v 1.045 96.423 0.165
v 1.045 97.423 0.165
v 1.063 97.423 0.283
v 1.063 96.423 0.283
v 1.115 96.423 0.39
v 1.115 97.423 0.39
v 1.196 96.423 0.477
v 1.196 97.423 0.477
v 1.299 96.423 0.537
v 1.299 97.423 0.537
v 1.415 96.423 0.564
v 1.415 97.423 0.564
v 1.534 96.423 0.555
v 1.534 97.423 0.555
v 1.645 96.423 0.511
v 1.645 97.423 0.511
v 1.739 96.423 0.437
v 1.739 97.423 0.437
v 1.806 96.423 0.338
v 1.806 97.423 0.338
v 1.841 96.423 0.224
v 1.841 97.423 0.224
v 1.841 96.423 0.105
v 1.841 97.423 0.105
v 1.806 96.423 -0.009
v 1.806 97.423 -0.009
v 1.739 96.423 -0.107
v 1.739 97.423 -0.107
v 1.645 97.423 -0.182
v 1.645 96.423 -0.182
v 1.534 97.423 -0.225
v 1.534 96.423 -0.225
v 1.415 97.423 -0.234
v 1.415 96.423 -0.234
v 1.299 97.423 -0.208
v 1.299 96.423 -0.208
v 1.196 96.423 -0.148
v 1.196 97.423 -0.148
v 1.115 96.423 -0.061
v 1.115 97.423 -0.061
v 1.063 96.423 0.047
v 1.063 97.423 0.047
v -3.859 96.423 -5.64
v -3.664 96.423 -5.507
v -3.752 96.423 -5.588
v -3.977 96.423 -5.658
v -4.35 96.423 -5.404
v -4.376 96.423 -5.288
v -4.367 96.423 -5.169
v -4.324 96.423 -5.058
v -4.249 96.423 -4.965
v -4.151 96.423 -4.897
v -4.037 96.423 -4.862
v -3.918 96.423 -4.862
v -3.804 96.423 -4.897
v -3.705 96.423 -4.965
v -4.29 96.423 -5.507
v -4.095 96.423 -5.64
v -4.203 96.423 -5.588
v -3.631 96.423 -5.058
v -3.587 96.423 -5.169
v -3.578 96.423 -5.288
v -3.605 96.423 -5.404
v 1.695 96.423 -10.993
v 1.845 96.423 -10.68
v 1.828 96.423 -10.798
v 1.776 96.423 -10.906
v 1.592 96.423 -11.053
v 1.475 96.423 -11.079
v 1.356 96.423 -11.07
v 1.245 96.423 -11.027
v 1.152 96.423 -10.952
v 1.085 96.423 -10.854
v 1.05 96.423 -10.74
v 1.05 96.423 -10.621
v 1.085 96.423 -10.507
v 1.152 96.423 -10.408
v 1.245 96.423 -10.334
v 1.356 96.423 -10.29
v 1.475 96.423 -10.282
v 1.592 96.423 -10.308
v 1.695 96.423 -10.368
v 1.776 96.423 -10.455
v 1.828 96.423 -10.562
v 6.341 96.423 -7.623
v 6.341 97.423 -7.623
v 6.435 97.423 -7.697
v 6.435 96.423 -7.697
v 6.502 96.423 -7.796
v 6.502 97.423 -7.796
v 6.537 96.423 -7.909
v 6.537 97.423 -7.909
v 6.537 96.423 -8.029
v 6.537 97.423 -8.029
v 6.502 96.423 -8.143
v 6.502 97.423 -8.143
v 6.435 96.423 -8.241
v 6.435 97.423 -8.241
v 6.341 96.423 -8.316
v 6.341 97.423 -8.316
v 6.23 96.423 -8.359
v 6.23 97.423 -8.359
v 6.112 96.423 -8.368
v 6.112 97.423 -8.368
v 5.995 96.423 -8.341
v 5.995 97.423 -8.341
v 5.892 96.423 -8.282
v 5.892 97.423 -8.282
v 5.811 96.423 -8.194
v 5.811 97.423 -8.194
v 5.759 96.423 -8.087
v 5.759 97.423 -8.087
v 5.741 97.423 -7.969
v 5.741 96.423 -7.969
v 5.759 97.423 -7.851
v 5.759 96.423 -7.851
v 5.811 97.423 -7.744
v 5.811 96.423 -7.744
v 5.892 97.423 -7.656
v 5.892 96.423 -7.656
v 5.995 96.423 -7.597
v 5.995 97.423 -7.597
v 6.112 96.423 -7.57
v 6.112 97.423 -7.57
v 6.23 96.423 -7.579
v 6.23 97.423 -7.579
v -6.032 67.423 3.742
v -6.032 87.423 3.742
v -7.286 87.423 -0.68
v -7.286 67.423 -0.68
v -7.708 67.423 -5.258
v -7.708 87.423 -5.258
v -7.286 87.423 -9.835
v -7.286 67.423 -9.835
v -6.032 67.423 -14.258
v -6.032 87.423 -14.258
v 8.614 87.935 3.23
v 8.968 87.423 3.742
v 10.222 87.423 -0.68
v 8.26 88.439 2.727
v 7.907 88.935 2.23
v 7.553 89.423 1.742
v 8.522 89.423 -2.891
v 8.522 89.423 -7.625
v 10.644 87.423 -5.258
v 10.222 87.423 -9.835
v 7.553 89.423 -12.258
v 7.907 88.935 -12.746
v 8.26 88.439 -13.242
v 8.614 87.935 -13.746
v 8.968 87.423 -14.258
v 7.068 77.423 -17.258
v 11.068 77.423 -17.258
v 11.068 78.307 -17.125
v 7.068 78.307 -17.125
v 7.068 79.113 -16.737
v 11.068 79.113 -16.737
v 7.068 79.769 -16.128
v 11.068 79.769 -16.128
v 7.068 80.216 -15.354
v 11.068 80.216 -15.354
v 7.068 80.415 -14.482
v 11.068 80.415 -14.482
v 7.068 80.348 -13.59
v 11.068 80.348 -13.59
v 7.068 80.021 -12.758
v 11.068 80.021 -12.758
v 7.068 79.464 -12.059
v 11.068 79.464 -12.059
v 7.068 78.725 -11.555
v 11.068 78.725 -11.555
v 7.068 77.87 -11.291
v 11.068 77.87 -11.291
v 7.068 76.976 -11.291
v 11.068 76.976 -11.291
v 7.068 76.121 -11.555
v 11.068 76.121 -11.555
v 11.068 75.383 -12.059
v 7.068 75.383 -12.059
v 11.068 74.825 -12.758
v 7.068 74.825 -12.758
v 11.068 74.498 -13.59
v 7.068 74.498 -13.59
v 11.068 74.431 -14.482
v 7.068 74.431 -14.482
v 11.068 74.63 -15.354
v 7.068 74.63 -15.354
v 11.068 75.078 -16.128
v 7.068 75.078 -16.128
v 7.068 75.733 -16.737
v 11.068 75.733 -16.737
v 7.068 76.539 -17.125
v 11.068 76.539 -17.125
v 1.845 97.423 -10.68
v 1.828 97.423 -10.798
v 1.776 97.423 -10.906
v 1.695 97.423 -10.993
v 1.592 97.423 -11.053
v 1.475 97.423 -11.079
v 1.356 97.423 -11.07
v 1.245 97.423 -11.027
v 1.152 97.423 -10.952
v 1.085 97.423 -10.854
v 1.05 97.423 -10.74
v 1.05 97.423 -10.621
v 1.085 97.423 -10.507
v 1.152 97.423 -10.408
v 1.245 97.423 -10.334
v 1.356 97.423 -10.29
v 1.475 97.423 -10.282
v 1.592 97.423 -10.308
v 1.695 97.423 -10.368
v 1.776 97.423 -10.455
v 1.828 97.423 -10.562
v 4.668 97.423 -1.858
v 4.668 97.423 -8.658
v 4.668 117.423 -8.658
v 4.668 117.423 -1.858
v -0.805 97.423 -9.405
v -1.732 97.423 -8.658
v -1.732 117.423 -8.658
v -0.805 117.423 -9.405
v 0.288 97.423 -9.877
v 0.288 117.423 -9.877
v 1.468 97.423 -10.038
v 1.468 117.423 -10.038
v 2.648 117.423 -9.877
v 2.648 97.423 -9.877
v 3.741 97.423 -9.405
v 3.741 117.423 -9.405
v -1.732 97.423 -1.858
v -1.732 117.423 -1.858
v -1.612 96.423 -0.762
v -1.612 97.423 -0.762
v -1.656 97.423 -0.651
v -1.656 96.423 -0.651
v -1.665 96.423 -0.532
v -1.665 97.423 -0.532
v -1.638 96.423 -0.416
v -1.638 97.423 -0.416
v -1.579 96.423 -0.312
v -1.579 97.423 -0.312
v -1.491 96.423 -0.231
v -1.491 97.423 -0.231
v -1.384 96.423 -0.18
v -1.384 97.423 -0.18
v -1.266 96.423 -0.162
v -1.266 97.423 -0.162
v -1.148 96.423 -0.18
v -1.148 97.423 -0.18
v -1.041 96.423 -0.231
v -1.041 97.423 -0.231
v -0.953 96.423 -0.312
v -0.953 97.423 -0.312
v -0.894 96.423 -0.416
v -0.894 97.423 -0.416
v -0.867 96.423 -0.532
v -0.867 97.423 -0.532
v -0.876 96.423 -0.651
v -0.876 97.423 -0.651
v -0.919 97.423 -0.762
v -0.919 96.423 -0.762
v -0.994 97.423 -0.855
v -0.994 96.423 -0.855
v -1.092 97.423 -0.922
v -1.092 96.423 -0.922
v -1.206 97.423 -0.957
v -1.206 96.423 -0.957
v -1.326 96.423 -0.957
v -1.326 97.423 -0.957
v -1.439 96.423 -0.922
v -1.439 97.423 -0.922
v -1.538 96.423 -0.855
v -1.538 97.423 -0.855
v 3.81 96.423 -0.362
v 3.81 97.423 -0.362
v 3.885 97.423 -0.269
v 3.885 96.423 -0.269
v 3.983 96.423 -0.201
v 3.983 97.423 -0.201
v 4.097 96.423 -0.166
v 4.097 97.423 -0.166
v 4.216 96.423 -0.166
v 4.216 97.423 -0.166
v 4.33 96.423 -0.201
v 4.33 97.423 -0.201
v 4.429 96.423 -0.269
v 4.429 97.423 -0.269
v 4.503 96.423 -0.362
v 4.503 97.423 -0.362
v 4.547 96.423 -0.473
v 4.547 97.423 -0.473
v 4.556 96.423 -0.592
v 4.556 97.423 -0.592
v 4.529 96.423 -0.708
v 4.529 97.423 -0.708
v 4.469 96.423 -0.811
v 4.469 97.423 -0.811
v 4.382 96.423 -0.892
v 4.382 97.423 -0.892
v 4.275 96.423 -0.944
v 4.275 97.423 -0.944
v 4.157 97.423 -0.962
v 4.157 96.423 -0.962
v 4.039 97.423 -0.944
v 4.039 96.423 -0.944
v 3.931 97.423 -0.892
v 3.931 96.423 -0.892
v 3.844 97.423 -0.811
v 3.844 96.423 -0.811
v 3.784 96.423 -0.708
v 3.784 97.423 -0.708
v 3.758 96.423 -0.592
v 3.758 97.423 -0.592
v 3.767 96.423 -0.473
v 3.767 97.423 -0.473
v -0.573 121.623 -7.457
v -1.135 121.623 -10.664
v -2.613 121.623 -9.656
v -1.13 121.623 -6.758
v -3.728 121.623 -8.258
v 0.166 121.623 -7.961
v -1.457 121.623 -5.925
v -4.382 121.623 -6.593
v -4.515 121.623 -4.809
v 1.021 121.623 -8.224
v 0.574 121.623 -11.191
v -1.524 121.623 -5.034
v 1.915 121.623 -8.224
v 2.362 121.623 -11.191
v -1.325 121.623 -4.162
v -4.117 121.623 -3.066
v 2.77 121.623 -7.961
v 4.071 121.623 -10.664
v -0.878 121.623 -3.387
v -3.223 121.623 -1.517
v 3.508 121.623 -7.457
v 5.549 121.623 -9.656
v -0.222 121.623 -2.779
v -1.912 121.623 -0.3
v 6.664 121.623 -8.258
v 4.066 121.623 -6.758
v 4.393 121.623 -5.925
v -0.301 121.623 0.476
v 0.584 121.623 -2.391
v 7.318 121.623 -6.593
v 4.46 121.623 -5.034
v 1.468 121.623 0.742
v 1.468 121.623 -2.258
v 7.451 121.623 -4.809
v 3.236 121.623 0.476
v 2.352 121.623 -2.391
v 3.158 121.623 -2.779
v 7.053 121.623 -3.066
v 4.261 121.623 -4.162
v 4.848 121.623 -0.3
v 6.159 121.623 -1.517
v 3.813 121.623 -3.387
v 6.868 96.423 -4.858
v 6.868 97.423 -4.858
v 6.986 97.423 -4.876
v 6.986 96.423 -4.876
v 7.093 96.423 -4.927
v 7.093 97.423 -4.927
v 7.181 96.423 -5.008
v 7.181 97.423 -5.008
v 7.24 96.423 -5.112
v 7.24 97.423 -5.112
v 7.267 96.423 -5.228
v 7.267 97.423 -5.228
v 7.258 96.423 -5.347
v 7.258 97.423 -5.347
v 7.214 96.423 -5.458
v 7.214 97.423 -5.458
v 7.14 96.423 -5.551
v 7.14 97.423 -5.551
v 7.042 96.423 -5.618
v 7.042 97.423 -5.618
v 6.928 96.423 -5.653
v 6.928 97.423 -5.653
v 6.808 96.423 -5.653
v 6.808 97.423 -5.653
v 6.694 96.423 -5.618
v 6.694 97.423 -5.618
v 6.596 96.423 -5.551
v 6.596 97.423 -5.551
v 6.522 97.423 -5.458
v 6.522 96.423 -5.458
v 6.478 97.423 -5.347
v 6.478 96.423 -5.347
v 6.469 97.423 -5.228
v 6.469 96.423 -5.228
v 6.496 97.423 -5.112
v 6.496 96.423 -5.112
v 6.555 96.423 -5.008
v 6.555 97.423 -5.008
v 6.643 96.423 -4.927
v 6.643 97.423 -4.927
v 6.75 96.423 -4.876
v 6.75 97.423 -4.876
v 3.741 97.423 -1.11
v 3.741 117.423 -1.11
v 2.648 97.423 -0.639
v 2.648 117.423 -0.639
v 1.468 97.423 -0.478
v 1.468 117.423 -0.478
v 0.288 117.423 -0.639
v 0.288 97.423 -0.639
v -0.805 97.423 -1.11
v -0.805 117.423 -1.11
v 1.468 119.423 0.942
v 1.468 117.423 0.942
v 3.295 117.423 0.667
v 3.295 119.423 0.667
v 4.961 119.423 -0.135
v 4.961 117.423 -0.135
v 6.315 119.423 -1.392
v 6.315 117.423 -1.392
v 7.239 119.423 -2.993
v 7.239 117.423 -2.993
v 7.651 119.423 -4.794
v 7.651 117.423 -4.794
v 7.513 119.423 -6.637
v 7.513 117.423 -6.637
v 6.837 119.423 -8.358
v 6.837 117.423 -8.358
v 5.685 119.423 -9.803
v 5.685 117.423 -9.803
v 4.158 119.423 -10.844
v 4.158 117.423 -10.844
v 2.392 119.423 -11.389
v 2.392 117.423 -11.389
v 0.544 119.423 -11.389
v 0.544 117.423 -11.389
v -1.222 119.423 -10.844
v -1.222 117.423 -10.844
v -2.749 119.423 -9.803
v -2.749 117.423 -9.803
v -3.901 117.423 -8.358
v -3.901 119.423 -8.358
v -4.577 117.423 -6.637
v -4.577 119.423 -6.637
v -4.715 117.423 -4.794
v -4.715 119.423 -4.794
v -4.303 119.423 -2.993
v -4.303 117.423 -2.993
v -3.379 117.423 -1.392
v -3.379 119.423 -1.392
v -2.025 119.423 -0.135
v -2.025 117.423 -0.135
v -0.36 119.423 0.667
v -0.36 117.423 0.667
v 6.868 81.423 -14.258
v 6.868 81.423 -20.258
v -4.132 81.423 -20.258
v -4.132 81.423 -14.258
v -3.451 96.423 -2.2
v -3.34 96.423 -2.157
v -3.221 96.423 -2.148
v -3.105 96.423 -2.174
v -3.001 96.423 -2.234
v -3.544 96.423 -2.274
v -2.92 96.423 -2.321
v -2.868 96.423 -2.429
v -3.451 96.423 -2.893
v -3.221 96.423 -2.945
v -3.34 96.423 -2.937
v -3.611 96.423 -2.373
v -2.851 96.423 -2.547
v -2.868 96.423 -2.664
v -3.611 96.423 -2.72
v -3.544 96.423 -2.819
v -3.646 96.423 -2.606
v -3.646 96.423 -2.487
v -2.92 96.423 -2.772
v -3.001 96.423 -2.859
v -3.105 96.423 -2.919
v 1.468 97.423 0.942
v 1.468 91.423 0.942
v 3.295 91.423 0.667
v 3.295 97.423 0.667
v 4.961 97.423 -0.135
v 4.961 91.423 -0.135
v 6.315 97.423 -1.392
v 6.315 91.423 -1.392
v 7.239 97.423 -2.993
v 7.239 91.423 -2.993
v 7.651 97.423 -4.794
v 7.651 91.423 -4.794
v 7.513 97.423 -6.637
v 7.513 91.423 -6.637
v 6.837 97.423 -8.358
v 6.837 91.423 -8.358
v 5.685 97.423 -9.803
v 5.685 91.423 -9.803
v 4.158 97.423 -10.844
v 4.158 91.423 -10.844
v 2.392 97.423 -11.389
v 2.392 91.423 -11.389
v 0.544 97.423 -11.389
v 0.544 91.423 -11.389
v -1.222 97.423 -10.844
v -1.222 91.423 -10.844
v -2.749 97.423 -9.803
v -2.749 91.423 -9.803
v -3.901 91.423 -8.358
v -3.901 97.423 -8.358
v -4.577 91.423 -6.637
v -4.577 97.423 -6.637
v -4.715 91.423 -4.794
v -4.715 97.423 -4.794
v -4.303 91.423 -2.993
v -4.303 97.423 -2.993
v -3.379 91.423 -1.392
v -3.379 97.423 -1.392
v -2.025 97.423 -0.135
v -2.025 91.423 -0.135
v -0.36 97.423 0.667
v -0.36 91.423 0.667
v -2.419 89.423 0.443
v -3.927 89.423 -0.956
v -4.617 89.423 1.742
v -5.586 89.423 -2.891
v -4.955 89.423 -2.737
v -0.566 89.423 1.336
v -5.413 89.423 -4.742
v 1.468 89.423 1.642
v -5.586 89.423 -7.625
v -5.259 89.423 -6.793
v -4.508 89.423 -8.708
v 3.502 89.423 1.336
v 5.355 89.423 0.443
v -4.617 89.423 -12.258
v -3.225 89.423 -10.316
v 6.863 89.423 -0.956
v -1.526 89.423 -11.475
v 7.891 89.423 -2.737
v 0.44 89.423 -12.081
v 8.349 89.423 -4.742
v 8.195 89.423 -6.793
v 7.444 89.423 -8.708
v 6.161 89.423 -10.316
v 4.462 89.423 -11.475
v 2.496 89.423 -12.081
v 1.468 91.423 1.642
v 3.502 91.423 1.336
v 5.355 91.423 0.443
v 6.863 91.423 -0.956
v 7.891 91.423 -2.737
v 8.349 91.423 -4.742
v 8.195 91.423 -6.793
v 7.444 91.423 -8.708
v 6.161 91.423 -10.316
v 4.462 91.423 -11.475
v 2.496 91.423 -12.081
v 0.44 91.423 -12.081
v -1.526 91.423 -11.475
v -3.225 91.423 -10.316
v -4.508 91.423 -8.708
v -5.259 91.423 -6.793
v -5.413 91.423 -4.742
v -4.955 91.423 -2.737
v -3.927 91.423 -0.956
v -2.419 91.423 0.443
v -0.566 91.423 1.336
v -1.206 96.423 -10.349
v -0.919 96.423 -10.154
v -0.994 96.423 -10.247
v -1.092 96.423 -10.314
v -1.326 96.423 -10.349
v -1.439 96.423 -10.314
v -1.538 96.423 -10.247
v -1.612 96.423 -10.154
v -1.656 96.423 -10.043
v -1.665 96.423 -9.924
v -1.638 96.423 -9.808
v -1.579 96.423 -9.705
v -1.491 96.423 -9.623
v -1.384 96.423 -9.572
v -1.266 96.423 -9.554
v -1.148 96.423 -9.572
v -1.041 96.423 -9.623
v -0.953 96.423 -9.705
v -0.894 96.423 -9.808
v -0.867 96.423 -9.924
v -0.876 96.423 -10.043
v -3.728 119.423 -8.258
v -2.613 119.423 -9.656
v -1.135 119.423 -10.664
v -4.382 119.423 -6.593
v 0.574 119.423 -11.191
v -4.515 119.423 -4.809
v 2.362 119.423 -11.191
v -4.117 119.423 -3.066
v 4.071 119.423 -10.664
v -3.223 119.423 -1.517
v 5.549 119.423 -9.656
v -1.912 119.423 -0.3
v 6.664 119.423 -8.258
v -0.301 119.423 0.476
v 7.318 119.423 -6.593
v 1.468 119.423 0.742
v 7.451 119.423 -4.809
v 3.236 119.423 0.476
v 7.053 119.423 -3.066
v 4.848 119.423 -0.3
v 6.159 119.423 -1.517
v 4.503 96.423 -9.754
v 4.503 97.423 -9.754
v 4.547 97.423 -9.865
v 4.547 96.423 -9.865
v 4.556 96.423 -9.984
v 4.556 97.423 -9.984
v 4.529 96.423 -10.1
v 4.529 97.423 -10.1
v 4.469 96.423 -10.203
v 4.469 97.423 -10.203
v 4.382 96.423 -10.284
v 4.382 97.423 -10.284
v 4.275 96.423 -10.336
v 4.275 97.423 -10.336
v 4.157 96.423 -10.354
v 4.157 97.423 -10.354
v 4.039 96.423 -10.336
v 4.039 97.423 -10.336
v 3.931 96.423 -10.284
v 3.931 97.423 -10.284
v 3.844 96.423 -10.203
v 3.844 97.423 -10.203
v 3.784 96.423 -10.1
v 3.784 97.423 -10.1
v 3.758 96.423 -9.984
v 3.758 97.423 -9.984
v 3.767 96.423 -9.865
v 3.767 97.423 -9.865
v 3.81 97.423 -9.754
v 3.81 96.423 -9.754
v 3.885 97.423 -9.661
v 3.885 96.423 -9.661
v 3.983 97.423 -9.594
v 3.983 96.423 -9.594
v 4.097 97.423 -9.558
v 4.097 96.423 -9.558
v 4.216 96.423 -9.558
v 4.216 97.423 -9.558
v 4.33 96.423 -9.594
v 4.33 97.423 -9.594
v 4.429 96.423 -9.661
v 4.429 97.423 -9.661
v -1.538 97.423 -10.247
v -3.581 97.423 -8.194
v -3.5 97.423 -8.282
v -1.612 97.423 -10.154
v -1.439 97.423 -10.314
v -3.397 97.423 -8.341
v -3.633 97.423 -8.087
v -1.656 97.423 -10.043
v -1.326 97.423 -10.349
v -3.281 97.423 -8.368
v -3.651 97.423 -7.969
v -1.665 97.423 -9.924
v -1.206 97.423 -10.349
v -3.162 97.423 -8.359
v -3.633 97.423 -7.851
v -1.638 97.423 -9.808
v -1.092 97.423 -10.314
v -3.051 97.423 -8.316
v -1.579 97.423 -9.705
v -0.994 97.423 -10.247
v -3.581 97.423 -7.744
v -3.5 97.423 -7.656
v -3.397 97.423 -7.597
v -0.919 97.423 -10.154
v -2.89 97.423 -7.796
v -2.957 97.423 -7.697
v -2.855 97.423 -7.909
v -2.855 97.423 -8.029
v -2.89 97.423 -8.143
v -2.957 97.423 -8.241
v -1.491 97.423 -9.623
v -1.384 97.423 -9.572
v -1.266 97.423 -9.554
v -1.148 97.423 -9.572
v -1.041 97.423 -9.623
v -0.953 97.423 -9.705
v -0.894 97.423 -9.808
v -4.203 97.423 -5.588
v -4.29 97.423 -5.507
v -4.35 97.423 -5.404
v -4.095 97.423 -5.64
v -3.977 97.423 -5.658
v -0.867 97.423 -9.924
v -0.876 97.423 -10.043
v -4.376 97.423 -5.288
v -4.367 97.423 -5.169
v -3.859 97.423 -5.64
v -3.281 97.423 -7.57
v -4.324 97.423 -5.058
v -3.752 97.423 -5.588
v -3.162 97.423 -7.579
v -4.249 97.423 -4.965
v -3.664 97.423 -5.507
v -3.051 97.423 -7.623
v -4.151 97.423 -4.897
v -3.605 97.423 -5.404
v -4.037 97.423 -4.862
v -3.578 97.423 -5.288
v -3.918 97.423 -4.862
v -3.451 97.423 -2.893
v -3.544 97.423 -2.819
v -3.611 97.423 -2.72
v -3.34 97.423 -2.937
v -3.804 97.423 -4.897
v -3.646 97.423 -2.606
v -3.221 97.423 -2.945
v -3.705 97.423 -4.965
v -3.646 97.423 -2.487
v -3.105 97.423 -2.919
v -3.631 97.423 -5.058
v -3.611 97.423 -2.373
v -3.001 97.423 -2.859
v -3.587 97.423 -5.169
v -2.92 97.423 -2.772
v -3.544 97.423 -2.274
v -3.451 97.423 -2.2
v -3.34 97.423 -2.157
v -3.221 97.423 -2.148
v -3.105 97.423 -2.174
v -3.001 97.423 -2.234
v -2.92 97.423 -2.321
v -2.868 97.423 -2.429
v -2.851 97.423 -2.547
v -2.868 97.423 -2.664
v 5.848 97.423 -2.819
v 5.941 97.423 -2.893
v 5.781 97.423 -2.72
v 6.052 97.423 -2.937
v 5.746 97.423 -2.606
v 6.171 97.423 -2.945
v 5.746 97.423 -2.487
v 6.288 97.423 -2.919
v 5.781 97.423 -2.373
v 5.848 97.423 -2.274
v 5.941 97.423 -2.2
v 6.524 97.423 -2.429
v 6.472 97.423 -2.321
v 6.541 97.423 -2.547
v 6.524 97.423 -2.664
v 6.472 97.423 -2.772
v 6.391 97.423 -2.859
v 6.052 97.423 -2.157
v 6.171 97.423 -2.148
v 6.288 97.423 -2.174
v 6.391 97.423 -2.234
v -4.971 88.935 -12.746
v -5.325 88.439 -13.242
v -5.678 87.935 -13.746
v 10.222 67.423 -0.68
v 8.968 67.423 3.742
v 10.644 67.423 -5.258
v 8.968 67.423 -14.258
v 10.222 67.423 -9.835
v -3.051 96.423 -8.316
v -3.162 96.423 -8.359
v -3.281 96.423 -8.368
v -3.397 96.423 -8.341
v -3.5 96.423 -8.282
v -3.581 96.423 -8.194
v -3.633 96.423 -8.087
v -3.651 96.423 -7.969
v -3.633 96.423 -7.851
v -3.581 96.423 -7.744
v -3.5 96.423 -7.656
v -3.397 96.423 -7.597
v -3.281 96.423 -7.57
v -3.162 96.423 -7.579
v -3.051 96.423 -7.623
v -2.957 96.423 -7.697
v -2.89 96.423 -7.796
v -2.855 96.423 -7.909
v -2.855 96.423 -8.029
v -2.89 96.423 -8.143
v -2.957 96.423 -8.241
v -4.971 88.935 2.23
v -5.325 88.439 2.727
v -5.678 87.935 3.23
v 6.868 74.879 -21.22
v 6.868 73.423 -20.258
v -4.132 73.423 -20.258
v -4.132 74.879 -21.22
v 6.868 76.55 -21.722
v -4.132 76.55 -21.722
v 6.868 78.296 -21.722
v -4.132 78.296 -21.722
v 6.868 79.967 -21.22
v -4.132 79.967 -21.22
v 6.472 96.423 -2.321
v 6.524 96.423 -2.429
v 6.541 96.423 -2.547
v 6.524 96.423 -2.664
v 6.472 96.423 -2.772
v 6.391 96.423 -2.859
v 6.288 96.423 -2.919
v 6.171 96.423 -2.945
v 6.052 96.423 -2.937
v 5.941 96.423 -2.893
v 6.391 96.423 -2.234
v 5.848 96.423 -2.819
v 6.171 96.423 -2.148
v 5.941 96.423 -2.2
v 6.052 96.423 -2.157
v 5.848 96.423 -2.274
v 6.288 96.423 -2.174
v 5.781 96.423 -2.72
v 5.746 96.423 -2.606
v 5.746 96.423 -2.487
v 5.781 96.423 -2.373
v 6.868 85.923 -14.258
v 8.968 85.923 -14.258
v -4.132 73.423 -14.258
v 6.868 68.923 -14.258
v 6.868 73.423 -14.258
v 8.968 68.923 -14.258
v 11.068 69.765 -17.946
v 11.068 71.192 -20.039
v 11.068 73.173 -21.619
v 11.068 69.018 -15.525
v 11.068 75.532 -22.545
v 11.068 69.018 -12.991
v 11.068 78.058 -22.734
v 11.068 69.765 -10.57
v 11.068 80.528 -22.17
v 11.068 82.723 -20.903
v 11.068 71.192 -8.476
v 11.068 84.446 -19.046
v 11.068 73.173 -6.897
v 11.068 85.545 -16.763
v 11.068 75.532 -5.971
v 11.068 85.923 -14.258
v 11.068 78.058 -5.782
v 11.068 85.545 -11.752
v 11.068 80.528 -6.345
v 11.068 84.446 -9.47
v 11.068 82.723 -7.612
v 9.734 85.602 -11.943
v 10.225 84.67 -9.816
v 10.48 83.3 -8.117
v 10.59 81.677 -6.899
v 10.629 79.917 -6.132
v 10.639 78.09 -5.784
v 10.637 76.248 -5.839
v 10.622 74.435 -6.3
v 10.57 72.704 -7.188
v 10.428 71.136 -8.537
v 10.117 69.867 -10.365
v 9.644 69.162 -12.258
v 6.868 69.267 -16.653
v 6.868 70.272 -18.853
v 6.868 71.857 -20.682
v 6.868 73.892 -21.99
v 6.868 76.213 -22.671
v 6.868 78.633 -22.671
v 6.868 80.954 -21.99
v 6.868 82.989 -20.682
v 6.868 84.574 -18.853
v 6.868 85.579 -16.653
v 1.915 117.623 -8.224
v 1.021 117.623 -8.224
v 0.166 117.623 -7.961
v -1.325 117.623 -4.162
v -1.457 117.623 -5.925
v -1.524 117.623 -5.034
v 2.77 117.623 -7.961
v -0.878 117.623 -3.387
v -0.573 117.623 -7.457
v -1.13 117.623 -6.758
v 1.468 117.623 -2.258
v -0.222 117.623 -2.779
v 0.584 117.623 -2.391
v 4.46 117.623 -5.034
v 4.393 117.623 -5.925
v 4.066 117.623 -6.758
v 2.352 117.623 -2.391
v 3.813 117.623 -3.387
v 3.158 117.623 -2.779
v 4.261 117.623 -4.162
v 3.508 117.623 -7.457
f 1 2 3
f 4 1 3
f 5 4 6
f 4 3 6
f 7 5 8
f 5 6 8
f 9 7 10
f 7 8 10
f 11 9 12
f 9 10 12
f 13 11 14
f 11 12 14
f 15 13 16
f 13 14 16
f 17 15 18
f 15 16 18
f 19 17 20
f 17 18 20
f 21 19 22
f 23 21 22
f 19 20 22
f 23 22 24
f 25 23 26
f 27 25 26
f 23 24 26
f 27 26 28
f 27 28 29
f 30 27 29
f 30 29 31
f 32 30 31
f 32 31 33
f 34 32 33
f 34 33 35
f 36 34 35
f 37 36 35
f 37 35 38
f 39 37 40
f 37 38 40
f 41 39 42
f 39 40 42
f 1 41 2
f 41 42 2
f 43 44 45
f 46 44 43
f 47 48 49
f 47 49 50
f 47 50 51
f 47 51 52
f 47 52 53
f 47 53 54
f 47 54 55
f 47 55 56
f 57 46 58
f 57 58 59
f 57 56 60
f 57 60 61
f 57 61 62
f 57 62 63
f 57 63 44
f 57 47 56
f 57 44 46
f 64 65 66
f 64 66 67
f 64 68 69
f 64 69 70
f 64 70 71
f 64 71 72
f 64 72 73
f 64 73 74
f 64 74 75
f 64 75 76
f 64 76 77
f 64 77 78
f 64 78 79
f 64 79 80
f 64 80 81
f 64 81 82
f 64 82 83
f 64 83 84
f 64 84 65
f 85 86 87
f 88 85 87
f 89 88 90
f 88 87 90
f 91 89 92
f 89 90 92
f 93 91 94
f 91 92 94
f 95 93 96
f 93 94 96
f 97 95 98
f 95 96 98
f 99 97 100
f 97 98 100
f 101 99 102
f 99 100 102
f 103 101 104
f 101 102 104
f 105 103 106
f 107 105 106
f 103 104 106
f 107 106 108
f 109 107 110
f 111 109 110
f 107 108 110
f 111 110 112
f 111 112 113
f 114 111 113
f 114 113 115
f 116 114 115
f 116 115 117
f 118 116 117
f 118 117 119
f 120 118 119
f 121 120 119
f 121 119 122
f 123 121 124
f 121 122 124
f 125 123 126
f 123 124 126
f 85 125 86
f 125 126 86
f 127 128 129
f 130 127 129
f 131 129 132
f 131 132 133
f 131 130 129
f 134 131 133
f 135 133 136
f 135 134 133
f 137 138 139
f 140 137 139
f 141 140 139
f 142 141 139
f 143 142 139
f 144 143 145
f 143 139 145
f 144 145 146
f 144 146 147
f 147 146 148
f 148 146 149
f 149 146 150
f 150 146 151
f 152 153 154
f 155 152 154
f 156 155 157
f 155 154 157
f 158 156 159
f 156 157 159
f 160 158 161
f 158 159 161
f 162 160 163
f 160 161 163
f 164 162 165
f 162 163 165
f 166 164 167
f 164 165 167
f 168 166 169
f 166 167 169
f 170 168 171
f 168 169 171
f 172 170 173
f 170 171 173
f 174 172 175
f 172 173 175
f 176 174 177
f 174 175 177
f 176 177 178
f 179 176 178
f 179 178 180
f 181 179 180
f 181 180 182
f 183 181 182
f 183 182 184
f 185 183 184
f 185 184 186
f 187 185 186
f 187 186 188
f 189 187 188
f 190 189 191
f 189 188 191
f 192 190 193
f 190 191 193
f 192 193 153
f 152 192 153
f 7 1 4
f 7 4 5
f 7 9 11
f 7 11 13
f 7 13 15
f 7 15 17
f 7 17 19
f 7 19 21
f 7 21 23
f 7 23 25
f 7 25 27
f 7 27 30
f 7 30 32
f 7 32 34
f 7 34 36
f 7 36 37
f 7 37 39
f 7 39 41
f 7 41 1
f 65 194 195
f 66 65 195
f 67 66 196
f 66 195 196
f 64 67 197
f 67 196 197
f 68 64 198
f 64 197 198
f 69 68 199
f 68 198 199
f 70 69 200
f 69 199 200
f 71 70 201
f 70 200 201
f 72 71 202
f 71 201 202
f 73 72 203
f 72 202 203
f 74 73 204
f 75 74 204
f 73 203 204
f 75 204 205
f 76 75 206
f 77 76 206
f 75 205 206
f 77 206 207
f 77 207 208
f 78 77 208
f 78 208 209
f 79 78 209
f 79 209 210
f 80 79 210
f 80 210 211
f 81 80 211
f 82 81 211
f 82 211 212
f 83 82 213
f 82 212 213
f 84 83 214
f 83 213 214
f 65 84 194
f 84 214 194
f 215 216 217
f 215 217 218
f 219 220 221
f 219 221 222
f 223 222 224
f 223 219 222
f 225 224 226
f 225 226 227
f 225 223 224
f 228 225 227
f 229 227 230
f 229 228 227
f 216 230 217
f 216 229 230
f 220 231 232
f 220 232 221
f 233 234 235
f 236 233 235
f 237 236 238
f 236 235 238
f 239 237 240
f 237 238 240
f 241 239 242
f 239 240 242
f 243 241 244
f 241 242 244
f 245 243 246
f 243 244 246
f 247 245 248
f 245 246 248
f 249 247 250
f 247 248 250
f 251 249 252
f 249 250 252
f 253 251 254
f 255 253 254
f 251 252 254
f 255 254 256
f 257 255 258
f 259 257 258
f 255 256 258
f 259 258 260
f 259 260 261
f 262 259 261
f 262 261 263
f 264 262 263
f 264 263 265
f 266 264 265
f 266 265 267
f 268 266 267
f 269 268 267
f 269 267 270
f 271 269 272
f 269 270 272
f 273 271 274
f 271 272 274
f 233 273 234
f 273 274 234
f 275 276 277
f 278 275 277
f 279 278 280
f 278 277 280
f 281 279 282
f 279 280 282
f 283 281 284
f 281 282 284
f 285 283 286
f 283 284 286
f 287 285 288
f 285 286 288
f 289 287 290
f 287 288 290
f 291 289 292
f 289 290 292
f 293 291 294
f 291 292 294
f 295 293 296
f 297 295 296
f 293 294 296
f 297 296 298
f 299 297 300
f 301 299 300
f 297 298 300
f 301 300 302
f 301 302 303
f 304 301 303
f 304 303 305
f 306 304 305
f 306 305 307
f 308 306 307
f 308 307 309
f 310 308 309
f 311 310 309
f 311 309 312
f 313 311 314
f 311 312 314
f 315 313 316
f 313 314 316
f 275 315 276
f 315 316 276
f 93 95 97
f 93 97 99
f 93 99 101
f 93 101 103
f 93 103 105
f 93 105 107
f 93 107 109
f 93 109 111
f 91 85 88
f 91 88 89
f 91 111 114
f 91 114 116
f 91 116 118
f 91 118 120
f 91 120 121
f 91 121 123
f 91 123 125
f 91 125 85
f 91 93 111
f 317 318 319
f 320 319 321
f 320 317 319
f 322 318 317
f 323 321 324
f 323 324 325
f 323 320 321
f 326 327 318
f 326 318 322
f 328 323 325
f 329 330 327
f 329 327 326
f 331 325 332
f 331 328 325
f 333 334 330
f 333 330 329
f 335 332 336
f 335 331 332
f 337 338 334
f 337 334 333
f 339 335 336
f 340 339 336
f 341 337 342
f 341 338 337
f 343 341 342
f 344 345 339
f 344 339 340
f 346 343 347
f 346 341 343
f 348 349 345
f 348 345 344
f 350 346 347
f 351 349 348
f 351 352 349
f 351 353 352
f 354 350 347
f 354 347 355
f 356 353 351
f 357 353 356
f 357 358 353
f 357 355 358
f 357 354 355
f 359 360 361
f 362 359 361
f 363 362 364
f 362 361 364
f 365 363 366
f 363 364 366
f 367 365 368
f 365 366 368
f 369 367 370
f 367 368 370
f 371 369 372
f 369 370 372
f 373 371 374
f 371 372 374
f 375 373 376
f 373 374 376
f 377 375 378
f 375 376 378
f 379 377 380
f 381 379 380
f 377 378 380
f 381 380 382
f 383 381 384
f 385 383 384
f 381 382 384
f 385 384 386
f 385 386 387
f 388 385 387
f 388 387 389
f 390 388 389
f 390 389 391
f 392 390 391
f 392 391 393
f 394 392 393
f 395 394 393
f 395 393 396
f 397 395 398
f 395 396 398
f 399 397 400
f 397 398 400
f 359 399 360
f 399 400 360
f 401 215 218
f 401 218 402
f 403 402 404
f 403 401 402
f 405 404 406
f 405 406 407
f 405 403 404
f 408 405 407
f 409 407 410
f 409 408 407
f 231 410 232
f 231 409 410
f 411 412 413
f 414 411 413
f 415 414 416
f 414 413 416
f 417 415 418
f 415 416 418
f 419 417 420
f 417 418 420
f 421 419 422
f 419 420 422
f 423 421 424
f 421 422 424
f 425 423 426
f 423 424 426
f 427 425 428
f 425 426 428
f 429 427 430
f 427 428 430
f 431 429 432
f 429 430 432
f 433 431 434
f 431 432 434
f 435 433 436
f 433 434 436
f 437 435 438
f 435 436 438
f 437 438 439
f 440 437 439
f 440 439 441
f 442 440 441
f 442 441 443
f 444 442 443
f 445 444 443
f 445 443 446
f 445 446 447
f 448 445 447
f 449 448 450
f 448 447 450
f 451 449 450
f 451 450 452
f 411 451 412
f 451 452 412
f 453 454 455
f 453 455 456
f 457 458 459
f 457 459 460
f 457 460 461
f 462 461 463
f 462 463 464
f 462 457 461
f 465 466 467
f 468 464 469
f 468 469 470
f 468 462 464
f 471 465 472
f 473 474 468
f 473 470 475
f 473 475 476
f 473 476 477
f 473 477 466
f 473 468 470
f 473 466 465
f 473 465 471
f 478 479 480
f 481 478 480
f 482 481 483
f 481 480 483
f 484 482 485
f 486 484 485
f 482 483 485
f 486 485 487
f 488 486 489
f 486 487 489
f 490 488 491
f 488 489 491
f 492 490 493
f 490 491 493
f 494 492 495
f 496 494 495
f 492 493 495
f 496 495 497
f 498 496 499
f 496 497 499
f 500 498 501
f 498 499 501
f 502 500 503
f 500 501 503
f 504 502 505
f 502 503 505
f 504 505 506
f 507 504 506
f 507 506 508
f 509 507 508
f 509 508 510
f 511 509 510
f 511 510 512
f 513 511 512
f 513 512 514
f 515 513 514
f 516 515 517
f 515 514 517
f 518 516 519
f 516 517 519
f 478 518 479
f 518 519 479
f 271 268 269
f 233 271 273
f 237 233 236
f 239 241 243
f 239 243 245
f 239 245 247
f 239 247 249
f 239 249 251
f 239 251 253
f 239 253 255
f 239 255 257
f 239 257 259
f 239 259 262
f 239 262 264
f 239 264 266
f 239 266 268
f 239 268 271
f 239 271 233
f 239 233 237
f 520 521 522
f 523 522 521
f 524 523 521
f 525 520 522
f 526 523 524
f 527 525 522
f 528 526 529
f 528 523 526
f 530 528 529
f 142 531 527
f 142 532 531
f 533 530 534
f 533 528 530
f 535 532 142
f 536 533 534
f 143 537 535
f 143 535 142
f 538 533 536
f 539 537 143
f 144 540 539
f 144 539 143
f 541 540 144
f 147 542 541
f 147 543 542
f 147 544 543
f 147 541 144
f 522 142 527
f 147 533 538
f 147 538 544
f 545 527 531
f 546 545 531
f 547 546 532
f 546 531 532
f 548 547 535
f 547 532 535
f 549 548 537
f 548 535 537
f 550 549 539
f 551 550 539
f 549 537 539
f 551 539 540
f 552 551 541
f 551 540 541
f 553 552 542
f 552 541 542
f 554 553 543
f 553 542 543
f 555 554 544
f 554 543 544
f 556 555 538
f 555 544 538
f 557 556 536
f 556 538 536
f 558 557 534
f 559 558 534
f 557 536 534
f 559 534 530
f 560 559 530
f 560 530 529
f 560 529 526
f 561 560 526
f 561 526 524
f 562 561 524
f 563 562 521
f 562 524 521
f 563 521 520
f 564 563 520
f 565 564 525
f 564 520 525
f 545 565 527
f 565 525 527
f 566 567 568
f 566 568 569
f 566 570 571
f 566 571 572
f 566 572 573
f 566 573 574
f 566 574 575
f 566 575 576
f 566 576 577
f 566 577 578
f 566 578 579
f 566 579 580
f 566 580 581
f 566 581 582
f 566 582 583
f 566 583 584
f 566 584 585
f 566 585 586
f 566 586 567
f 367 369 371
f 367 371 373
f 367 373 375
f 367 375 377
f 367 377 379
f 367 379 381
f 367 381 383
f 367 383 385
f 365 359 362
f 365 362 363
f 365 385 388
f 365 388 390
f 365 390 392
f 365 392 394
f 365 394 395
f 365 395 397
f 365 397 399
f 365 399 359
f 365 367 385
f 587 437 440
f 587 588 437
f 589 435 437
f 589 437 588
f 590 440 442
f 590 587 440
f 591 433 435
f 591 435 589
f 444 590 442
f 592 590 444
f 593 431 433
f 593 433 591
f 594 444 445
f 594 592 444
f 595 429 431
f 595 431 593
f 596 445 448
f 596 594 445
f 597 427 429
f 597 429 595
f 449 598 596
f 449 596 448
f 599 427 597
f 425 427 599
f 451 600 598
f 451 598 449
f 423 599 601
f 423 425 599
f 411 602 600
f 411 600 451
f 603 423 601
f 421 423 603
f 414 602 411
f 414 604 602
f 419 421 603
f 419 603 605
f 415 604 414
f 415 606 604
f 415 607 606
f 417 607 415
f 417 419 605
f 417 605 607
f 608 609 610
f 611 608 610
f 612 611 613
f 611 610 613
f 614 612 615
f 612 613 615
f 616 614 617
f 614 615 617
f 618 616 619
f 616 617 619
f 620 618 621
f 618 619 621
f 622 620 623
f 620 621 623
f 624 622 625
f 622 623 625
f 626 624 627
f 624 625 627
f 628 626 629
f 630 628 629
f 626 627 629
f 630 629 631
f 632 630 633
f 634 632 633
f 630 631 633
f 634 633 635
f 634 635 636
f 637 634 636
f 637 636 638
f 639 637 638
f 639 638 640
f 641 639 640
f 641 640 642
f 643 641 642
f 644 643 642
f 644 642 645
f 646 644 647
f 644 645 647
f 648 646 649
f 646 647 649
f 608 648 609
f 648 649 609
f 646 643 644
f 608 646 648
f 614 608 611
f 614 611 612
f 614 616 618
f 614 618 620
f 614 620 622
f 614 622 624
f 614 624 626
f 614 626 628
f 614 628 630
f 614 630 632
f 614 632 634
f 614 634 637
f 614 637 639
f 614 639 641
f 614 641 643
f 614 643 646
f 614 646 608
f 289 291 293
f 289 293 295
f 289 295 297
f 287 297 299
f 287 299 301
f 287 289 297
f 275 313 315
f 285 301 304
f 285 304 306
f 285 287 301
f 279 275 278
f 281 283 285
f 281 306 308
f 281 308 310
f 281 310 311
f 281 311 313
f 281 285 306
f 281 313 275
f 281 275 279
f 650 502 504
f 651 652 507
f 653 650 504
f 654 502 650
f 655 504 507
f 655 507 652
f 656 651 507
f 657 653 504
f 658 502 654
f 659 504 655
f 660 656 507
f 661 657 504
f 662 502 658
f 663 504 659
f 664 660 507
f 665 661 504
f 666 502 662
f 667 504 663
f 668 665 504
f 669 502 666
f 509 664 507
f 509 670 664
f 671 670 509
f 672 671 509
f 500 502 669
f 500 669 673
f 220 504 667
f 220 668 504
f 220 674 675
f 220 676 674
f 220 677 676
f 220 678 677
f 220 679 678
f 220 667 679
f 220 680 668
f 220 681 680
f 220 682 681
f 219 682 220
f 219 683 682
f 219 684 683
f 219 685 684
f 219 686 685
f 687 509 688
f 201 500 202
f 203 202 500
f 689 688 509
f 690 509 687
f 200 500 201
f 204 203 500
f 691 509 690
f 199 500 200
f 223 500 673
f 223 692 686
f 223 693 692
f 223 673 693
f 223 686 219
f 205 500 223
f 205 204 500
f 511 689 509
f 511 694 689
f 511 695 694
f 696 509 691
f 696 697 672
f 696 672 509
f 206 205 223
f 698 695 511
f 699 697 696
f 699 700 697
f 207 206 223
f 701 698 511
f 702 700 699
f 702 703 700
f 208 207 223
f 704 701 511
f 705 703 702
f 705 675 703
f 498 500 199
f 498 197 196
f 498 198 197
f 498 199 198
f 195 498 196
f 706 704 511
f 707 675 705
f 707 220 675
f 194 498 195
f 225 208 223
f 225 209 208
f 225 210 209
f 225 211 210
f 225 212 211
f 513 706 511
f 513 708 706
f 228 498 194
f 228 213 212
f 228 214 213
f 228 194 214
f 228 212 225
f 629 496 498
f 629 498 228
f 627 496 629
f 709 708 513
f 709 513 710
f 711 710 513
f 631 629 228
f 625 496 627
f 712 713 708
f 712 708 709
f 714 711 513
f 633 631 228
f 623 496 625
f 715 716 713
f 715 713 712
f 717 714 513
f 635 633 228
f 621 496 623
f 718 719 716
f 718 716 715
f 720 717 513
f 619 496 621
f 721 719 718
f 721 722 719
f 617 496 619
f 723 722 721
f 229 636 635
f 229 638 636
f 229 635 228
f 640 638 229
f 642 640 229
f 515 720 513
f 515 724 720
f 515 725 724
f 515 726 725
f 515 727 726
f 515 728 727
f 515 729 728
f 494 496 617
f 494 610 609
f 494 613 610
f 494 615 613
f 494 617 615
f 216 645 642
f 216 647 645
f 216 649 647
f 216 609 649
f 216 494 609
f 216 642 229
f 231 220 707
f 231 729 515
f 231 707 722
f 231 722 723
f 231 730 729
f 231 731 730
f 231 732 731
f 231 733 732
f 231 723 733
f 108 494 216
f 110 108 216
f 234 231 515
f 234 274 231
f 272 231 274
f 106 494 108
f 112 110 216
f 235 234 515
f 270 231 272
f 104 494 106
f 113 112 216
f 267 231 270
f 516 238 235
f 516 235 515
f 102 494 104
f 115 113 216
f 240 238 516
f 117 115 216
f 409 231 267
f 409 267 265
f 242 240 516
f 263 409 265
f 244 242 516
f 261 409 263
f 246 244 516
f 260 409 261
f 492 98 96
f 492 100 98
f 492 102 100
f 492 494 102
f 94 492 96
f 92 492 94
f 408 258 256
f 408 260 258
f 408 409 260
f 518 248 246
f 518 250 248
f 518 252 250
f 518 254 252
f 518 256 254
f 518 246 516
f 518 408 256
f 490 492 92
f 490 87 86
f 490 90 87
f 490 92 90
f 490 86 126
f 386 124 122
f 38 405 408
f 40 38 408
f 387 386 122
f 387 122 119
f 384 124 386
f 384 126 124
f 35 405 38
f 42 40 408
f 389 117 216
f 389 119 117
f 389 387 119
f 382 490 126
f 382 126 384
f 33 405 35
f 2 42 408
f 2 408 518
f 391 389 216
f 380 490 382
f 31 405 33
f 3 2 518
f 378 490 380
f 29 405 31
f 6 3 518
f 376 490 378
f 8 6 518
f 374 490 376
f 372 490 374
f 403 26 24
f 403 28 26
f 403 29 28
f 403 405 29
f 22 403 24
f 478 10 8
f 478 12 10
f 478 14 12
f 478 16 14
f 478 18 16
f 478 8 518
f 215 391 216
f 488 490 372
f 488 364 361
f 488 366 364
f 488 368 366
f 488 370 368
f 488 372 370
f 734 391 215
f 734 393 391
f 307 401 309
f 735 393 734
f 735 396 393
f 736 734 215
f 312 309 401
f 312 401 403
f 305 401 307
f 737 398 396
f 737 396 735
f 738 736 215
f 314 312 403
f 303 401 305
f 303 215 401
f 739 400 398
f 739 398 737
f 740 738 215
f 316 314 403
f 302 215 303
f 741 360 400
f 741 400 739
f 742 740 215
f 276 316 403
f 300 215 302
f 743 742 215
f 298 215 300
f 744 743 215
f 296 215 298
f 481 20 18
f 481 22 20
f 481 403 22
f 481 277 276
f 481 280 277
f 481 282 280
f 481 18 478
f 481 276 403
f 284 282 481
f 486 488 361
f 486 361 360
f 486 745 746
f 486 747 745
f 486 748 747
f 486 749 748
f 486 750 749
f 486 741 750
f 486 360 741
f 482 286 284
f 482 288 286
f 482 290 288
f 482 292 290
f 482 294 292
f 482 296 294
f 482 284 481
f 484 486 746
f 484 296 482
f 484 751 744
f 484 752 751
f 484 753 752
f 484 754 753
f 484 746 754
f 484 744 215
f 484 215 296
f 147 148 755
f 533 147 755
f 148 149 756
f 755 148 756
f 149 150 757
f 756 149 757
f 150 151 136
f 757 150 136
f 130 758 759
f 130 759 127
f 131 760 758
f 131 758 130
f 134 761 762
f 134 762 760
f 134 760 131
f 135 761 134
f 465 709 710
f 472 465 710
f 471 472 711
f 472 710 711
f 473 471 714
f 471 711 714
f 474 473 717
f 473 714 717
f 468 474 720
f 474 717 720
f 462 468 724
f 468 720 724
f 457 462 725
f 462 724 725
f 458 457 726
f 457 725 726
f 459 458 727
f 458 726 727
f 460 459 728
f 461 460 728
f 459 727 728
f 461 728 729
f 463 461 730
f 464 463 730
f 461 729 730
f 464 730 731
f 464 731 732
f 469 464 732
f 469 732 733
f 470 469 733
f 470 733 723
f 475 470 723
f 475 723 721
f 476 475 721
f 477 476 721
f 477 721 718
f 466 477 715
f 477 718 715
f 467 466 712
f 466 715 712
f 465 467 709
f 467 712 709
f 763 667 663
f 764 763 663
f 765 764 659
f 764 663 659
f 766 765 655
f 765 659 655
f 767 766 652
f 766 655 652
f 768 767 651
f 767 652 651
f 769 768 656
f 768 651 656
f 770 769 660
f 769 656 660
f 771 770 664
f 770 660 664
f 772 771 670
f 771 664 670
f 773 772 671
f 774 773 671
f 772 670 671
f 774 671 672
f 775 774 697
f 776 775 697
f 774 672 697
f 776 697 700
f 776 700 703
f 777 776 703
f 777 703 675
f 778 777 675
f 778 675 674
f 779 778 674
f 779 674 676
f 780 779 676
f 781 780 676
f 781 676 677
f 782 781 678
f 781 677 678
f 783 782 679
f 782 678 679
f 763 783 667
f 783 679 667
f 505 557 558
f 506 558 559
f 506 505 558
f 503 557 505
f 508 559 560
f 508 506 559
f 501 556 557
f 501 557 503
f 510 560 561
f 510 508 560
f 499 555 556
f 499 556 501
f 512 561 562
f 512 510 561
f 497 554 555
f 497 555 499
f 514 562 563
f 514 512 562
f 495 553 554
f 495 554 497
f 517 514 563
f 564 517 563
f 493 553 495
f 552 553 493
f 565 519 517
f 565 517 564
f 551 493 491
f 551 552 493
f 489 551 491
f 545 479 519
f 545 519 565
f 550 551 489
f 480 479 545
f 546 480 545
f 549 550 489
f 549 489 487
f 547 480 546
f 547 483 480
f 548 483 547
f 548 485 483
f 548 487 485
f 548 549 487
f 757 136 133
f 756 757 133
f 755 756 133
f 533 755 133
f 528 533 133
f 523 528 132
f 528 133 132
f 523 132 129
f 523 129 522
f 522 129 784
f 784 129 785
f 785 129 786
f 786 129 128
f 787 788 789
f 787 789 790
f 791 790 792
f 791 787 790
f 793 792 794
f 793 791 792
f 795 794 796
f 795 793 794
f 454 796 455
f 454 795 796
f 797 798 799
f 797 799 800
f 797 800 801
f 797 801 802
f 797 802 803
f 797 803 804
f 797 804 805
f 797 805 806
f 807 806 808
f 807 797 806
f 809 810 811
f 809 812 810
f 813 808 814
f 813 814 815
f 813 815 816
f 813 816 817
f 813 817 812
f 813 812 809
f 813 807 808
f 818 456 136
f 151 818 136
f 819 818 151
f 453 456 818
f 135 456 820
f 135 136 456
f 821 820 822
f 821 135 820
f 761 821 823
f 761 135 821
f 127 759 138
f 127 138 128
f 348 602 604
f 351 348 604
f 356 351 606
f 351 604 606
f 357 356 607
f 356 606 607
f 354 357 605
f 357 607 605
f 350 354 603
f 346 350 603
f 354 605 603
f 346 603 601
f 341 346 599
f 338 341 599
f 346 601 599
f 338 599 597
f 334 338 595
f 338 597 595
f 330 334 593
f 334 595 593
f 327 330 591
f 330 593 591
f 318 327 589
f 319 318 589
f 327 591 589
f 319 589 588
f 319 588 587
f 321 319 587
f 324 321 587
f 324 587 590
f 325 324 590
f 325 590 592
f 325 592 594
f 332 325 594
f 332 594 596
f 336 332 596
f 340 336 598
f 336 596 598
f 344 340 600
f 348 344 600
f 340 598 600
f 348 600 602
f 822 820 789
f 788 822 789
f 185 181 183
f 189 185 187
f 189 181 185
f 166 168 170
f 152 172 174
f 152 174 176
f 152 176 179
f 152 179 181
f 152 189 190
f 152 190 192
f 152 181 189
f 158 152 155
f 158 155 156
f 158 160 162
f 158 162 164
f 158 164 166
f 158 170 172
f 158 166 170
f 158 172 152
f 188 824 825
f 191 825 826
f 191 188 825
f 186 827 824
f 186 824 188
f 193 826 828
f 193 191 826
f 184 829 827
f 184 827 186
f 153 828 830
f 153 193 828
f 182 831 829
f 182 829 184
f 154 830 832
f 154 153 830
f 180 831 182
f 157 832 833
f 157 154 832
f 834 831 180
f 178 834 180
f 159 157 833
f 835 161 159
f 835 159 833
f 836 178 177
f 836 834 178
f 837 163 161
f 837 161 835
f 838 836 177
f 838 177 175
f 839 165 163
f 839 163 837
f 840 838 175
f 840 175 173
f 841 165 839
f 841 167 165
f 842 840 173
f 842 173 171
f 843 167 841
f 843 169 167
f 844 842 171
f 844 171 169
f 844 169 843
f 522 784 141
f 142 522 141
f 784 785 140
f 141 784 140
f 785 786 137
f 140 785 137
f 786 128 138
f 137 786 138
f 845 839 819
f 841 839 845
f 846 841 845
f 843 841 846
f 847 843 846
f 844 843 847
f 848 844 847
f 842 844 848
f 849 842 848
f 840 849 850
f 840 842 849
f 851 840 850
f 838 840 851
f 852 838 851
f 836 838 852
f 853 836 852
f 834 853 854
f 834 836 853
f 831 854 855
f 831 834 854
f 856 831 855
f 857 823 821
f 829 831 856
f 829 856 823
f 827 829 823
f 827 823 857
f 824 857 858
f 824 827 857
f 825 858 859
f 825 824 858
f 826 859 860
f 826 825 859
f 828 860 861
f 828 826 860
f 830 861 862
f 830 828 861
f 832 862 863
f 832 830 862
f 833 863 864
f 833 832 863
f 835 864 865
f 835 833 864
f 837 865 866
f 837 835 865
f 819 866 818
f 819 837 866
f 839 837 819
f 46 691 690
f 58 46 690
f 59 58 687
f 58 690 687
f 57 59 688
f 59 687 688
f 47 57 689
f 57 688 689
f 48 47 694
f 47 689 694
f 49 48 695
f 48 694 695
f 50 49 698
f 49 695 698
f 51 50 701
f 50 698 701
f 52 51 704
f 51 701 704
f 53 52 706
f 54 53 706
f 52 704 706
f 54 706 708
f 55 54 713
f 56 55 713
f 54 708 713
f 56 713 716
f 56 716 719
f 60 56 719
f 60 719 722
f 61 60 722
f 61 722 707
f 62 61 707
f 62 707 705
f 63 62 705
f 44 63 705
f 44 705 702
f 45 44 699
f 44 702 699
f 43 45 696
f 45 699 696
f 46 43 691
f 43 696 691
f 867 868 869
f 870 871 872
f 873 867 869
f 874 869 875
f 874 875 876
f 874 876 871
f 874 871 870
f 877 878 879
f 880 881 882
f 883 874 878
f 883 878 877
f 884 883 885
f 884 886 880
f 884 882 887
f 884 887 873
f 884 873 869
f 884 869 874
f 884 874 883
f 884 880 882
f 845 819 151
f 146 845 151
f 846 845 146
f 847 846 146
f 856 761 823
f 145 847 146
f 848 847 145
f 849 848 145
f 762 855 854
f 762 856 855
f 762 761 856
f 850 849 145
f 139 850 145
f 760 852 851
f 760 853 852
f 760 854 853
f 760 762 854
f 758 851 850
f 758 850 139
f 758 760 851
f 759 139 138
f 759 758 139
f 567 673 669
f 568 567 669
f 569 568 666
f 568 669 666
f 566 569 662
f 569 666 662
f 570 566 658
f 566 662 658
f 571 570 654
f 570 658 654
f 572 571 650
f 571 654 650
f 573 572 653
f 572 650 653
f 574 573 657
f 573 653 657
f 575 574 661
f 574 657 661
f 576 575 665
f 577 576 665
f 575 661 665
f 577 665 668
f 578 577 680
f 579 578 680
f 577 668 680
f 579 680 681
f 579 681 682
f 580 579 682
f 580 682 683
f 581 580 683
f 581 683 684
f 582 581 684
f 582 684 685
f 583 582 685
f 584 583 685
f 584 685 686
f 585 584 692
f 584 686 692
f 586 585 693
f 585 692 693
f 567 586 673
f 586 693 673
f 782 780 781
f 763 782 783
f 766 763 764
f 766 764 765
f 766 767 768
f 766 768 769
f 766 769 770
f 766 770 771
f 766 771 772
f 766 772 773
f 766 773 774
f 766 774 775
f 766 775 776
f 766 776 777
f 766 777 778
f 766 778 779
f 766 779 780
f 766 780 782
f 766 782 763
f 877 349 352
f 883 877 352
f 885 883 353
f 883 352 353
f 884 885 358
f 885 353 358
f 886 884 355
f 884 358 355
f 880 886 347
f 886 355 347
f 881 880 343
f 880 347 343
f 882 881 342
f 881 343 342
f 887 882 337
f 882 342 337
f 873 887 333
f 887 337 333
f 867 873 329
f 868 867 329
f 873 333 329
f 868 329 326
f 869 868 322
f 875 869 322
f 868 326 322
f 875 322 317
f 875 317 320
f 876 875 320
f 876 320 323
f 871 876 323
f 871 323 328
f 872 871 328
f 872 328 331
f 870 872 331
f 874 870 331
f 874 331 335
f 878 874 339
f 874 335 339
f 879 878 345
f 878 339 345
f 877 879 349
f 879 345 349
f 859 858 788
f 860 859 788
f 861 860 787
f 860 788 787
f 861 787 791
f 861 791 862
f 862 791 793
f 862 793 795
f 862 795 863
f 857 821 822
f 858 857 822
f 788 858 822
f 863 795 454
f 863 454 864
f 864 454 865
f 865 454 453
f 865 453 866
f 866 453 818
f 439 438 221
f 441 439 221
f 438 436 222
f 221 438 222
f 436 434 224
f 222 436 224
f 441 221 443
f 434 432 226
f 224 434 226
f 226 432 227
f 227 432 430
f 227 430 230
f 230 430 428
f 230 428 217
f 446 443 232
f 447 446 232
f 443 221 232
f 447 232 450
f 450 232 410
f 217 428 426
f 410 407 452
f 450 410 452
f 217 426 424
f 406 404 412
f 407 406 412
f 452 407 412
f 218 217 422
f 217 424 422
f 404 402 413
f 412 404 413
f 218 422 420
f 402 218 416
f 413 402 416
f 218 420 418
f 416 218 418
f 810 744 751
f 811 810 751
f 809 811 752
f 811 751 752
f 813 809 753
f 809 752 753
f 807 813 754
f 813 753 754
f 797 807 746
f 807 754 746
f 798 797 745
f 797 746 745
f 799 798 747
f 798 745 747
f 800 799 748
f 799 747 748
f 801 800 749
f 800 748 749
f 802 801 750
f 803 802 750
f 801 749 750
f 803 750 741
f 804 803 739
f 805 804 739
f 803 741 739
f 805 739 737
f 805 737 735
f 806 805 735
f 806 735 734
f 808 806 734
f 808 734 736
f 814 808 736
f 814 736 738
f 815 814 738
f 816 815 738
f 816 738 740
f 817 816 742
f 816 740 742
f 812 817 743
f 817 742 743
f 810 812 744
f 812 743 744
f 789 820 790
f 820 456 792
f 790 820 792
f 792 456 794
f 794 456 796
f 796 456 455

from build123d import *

# Parameters (mm, degrees)
BOSS_EXTRUDE1_DEPTH = 100
BOSS_EXTRUDE2_DEPTH = 10
BOSS_EXTRUDE2_DRAFT = 45
SKETCH3_R           = 34.5
BOSS_EXTRUDE3_DEPTH = 10
SKETCH4_R           = 31
BOSS_EXTRUDE4_DEPTH = 30
SKETCH5_R           = 2
CUT_EXTRUDE1_DEPTH  = 5
CIRPATTERN1_COUNT   = 12
BOSS_EXTRUDE5_DEPTH = 100
SKETCH7_R           = 31
BOSS_EXTRUDE6_DEPTH = 10
SKETCH8_R           = 30
BOSS_EXTRUDE7_DEPTH = 11
SKETCH10_R          = 42.5
BOSS_EXTRUDE8_DEPTH = 10.5
BOSS_EXTRUDE9_DEPTH = 55
SKETCH12_R          = 15
CUT_EXTRUDE2_DEPTH  = 20
SKETCH13_R          = 15
CUT_EXTRUDE3_DEPTH  = 20
L_EK1_SCALE         = 0.2


with BuildPart() as part:
    # Sketch1 → Boss-Extrude1 (new body)
    with BuildSketch(Plane(origin=(0, 0, 0), x_dir=(1, 0, 0), z_dir=(0, 1, 0))):
        with BuildLine():
            Line((-37.5, 45), (37.5, 45))
            ThreePointArc((37.5, 45), (45.880962103, 0), (37.5, -45))
            Line((37.5, -45), (-37.5, -45))
            ThreePointArc((-37.5, -45), (-45.880962103, 0), (-37.5, 45))
        make_face()
    extrude(amount=BOSS_EXTRUDE1_DEPTH)


with BuildPart() as boss_extrude2_tool:
    # Sketch2 → Boss-Extrude2 (with draft: the straight prism first)
    with BuildSketch(Plane(origin=(0, 100, 0), x_dir=(1, 0, 0), z_dir=(0, 1, 0))):
        with BuildLine():
            Line((-37.5, -45), (37.5, -45))
            ThreePointArc((37.5, -45), (45.880962103, 0), (37.5, 45))
            Line((37.5, 45), (-37.5, 45))
            ThreePointArc((-37.5, 45), (-45.880962103, 0), (-37.5, -45))
        make_face()
    extrude(amount=BOSS_EXTRUDE2_DEPTH)
    # Boss-Extrude2: the draft: its side faces are tilted about the plane it starts from
    boss_extrude2_sides = [boss_extrude2_tool.faces().sort_by_distance(p)[0] for p in [
        (0, 105, -45),
        (-45.880962103, 105, 0),
        (0, 105, 45),
        (45.880962103, 105, 0),
    ]]
    draft(boss_extrude2_sides, Plane(origin=(0, 100, 0), x_dir=(1, 0, 0), z_dir=(0, 1, 0)), BOSS_EXTRUDE2_DRAFT)


with BuildPart() as part_1:
    add(part.part)

    # Boss-Extrude2: add boss_extrude2_tool
    add(boss_extrude2_tool.part)

    # Sketch3 → Boss-Extrude3 (add)
    with BuildSketch(Plane(origin=(0, 110, 0), x_dir=(1, 0, 0), z_dir=(0, 1, 0))):
        with Locations(Location((0, 0, 0), (0, 0, 270))):
            Circle(SKETCH3_R)
    extrude(amount=BOSS_EXTRUDE3_DEPTH)

    # Sketch4 → Boss-Extrude4 (add)
    with BuildSketch(Plane(origin=(0, 120, 0), x_dir=(1, 0, 0), z_dir=(0, 1, 0))):
        with Locations(Location((0, 0, 0), (0, 0, 270))):
            Circle(SKETCH4_R)
    extrude(amount=BOSS_EXTRUDE4_DEPTH)

    # Sketch5 → Cut-Extrude1 (cut)
    with BuildSketch(Plane(origin=(0, 150, 0), x_dir=(1, 0, 0), z_dir=(0, 1, 0))):
        with Locations(Location((27, 0, 0), (0, 0, 270))):
            Circle(SKETCH5_R)
    cut_extrude1 = extrude(amount=-CUT_EXTRUDE1_DEPTH, mode=Mode.SUBTRACT)

    # CirPattern1: Cut-Extrude1 ×12 about axis
    cirpattern1_axis = Axis((-0.112852665, 0, 0), (0, 1, 0))
    for i in range(1, CIRPATTERN1_COUNT):
        add(cut_extrude1.rotate(cirpattern1_axis, i * 360 / CIRPATTERN1_COUNT), mode=Mode.SUBTRACT)

    # Sketch6 → Boss-Extrude5 (add)
    with BuildSketch(Plane(origin=(0, 150, 0), x_dir=(1, 0, 0), z_dir=(0, 1, 0))):
        with BuildLine():
            Line((-16, -17), (-16, 17))
            ThreePointArc((-16, 17), (0, 23.900331129), (16, 17))
            Line((16, 17), (16, -17))
            ThreePointArc((16, -17), (0, -23.900331129), (-16, -17))
        make_face()
    extrude(amount=BOSS_EXTRUDE5_DEPTH)

    # Sketch7 → Boss-Extrude6 (add)
    with BuildSketch(Plane(origin=(0, 250, 0), x_dir=(1, 0, 0), z_dir=(0, 1, 0))):
        with Locations(Location((0, 0, 0), (0, 0, 270))):
            Circle(SKETCH7_R)
    extrude(amount=BOSS_EXTRUDE6_DEPTH)

    # Sketch8 → Boss-Extrude7 (add)
    with BuildSketch(Plane(origin=(0, 260, 0), x_dir=(1, 0, 0), z_dir=(0, 1, 0))):
        with Locations(Location((0, 0, 0), (0, 0, 270))):
            Circle(SKETCH8_R)
    extrude(amount=BOSS_EXTRUDE7_DEPTH)

    # Sketch10 → Boss-Extrude8 (add, symmetric)
    with BuildSketch(Plane(origin=(37.5, 0, 0), x_dir=(0, 0, -1), z_dir=(1, 0, 0))):
        with Locations(Location((45, 50, 0), (0, 0, 90))):
            Circle(SKETCH10_R)
    extrude(amount=BOSS_EXTRUDE8_DEPTH, both=True)

    # Sketch11 → Boss-Extrude9 (add)
    with BuildSketch(Plane.ZY.offset(-27)):
        with BuildLine():
            Line((-45, 30), (-75, 30))
            ThreePointArc((-75, 30), (-82.639320225, 50), (-75, 70))
            Line((-75, 70), (-45, 70))
            Line((-45, 70), (-45, 30))
        make_face()
    extrude(amount=BOSS_EXTRUDE9_DEPTH)

    # Sketch12 → Cut-Extrude2 (cut)
    with BuildSketch(Plane(origin=(0, 271, 0), x_dir=(1, 0, 0), z_dir=(0, 1, 0))):
        with Locations(Location((0, 0, 0), (0, 0, 270))):
            Circle(SKETCH12_R)
    extrude(amount=-CUT_EXTRUDE2_DEPTH, mode=Mode.SUBTRACT)

    # Sketch13 → Cut-Extrude3 (cut)
    with BuildSketch(Plane(origin=(48, 0, 0), x_dir=(0, 0, -1), z_dir=(1, 0, 0))):
        with Locations((45, 50)):
            Circle(SKETCH13_R)
    extrude(amount=-CUT_EXTRUDE3_DEPTH, mode=Mode.SUBTRACT)


with BuildPart() as part_2:
    # Ölçek1: scaled about (1.834934624, 84.278783532, -6.572274509)
    add(part_1.part.scale(L_EK1_SCALE).moved(Location((1.467947699, 67.423026826, -5.257819607))))


solid = part_2.part
